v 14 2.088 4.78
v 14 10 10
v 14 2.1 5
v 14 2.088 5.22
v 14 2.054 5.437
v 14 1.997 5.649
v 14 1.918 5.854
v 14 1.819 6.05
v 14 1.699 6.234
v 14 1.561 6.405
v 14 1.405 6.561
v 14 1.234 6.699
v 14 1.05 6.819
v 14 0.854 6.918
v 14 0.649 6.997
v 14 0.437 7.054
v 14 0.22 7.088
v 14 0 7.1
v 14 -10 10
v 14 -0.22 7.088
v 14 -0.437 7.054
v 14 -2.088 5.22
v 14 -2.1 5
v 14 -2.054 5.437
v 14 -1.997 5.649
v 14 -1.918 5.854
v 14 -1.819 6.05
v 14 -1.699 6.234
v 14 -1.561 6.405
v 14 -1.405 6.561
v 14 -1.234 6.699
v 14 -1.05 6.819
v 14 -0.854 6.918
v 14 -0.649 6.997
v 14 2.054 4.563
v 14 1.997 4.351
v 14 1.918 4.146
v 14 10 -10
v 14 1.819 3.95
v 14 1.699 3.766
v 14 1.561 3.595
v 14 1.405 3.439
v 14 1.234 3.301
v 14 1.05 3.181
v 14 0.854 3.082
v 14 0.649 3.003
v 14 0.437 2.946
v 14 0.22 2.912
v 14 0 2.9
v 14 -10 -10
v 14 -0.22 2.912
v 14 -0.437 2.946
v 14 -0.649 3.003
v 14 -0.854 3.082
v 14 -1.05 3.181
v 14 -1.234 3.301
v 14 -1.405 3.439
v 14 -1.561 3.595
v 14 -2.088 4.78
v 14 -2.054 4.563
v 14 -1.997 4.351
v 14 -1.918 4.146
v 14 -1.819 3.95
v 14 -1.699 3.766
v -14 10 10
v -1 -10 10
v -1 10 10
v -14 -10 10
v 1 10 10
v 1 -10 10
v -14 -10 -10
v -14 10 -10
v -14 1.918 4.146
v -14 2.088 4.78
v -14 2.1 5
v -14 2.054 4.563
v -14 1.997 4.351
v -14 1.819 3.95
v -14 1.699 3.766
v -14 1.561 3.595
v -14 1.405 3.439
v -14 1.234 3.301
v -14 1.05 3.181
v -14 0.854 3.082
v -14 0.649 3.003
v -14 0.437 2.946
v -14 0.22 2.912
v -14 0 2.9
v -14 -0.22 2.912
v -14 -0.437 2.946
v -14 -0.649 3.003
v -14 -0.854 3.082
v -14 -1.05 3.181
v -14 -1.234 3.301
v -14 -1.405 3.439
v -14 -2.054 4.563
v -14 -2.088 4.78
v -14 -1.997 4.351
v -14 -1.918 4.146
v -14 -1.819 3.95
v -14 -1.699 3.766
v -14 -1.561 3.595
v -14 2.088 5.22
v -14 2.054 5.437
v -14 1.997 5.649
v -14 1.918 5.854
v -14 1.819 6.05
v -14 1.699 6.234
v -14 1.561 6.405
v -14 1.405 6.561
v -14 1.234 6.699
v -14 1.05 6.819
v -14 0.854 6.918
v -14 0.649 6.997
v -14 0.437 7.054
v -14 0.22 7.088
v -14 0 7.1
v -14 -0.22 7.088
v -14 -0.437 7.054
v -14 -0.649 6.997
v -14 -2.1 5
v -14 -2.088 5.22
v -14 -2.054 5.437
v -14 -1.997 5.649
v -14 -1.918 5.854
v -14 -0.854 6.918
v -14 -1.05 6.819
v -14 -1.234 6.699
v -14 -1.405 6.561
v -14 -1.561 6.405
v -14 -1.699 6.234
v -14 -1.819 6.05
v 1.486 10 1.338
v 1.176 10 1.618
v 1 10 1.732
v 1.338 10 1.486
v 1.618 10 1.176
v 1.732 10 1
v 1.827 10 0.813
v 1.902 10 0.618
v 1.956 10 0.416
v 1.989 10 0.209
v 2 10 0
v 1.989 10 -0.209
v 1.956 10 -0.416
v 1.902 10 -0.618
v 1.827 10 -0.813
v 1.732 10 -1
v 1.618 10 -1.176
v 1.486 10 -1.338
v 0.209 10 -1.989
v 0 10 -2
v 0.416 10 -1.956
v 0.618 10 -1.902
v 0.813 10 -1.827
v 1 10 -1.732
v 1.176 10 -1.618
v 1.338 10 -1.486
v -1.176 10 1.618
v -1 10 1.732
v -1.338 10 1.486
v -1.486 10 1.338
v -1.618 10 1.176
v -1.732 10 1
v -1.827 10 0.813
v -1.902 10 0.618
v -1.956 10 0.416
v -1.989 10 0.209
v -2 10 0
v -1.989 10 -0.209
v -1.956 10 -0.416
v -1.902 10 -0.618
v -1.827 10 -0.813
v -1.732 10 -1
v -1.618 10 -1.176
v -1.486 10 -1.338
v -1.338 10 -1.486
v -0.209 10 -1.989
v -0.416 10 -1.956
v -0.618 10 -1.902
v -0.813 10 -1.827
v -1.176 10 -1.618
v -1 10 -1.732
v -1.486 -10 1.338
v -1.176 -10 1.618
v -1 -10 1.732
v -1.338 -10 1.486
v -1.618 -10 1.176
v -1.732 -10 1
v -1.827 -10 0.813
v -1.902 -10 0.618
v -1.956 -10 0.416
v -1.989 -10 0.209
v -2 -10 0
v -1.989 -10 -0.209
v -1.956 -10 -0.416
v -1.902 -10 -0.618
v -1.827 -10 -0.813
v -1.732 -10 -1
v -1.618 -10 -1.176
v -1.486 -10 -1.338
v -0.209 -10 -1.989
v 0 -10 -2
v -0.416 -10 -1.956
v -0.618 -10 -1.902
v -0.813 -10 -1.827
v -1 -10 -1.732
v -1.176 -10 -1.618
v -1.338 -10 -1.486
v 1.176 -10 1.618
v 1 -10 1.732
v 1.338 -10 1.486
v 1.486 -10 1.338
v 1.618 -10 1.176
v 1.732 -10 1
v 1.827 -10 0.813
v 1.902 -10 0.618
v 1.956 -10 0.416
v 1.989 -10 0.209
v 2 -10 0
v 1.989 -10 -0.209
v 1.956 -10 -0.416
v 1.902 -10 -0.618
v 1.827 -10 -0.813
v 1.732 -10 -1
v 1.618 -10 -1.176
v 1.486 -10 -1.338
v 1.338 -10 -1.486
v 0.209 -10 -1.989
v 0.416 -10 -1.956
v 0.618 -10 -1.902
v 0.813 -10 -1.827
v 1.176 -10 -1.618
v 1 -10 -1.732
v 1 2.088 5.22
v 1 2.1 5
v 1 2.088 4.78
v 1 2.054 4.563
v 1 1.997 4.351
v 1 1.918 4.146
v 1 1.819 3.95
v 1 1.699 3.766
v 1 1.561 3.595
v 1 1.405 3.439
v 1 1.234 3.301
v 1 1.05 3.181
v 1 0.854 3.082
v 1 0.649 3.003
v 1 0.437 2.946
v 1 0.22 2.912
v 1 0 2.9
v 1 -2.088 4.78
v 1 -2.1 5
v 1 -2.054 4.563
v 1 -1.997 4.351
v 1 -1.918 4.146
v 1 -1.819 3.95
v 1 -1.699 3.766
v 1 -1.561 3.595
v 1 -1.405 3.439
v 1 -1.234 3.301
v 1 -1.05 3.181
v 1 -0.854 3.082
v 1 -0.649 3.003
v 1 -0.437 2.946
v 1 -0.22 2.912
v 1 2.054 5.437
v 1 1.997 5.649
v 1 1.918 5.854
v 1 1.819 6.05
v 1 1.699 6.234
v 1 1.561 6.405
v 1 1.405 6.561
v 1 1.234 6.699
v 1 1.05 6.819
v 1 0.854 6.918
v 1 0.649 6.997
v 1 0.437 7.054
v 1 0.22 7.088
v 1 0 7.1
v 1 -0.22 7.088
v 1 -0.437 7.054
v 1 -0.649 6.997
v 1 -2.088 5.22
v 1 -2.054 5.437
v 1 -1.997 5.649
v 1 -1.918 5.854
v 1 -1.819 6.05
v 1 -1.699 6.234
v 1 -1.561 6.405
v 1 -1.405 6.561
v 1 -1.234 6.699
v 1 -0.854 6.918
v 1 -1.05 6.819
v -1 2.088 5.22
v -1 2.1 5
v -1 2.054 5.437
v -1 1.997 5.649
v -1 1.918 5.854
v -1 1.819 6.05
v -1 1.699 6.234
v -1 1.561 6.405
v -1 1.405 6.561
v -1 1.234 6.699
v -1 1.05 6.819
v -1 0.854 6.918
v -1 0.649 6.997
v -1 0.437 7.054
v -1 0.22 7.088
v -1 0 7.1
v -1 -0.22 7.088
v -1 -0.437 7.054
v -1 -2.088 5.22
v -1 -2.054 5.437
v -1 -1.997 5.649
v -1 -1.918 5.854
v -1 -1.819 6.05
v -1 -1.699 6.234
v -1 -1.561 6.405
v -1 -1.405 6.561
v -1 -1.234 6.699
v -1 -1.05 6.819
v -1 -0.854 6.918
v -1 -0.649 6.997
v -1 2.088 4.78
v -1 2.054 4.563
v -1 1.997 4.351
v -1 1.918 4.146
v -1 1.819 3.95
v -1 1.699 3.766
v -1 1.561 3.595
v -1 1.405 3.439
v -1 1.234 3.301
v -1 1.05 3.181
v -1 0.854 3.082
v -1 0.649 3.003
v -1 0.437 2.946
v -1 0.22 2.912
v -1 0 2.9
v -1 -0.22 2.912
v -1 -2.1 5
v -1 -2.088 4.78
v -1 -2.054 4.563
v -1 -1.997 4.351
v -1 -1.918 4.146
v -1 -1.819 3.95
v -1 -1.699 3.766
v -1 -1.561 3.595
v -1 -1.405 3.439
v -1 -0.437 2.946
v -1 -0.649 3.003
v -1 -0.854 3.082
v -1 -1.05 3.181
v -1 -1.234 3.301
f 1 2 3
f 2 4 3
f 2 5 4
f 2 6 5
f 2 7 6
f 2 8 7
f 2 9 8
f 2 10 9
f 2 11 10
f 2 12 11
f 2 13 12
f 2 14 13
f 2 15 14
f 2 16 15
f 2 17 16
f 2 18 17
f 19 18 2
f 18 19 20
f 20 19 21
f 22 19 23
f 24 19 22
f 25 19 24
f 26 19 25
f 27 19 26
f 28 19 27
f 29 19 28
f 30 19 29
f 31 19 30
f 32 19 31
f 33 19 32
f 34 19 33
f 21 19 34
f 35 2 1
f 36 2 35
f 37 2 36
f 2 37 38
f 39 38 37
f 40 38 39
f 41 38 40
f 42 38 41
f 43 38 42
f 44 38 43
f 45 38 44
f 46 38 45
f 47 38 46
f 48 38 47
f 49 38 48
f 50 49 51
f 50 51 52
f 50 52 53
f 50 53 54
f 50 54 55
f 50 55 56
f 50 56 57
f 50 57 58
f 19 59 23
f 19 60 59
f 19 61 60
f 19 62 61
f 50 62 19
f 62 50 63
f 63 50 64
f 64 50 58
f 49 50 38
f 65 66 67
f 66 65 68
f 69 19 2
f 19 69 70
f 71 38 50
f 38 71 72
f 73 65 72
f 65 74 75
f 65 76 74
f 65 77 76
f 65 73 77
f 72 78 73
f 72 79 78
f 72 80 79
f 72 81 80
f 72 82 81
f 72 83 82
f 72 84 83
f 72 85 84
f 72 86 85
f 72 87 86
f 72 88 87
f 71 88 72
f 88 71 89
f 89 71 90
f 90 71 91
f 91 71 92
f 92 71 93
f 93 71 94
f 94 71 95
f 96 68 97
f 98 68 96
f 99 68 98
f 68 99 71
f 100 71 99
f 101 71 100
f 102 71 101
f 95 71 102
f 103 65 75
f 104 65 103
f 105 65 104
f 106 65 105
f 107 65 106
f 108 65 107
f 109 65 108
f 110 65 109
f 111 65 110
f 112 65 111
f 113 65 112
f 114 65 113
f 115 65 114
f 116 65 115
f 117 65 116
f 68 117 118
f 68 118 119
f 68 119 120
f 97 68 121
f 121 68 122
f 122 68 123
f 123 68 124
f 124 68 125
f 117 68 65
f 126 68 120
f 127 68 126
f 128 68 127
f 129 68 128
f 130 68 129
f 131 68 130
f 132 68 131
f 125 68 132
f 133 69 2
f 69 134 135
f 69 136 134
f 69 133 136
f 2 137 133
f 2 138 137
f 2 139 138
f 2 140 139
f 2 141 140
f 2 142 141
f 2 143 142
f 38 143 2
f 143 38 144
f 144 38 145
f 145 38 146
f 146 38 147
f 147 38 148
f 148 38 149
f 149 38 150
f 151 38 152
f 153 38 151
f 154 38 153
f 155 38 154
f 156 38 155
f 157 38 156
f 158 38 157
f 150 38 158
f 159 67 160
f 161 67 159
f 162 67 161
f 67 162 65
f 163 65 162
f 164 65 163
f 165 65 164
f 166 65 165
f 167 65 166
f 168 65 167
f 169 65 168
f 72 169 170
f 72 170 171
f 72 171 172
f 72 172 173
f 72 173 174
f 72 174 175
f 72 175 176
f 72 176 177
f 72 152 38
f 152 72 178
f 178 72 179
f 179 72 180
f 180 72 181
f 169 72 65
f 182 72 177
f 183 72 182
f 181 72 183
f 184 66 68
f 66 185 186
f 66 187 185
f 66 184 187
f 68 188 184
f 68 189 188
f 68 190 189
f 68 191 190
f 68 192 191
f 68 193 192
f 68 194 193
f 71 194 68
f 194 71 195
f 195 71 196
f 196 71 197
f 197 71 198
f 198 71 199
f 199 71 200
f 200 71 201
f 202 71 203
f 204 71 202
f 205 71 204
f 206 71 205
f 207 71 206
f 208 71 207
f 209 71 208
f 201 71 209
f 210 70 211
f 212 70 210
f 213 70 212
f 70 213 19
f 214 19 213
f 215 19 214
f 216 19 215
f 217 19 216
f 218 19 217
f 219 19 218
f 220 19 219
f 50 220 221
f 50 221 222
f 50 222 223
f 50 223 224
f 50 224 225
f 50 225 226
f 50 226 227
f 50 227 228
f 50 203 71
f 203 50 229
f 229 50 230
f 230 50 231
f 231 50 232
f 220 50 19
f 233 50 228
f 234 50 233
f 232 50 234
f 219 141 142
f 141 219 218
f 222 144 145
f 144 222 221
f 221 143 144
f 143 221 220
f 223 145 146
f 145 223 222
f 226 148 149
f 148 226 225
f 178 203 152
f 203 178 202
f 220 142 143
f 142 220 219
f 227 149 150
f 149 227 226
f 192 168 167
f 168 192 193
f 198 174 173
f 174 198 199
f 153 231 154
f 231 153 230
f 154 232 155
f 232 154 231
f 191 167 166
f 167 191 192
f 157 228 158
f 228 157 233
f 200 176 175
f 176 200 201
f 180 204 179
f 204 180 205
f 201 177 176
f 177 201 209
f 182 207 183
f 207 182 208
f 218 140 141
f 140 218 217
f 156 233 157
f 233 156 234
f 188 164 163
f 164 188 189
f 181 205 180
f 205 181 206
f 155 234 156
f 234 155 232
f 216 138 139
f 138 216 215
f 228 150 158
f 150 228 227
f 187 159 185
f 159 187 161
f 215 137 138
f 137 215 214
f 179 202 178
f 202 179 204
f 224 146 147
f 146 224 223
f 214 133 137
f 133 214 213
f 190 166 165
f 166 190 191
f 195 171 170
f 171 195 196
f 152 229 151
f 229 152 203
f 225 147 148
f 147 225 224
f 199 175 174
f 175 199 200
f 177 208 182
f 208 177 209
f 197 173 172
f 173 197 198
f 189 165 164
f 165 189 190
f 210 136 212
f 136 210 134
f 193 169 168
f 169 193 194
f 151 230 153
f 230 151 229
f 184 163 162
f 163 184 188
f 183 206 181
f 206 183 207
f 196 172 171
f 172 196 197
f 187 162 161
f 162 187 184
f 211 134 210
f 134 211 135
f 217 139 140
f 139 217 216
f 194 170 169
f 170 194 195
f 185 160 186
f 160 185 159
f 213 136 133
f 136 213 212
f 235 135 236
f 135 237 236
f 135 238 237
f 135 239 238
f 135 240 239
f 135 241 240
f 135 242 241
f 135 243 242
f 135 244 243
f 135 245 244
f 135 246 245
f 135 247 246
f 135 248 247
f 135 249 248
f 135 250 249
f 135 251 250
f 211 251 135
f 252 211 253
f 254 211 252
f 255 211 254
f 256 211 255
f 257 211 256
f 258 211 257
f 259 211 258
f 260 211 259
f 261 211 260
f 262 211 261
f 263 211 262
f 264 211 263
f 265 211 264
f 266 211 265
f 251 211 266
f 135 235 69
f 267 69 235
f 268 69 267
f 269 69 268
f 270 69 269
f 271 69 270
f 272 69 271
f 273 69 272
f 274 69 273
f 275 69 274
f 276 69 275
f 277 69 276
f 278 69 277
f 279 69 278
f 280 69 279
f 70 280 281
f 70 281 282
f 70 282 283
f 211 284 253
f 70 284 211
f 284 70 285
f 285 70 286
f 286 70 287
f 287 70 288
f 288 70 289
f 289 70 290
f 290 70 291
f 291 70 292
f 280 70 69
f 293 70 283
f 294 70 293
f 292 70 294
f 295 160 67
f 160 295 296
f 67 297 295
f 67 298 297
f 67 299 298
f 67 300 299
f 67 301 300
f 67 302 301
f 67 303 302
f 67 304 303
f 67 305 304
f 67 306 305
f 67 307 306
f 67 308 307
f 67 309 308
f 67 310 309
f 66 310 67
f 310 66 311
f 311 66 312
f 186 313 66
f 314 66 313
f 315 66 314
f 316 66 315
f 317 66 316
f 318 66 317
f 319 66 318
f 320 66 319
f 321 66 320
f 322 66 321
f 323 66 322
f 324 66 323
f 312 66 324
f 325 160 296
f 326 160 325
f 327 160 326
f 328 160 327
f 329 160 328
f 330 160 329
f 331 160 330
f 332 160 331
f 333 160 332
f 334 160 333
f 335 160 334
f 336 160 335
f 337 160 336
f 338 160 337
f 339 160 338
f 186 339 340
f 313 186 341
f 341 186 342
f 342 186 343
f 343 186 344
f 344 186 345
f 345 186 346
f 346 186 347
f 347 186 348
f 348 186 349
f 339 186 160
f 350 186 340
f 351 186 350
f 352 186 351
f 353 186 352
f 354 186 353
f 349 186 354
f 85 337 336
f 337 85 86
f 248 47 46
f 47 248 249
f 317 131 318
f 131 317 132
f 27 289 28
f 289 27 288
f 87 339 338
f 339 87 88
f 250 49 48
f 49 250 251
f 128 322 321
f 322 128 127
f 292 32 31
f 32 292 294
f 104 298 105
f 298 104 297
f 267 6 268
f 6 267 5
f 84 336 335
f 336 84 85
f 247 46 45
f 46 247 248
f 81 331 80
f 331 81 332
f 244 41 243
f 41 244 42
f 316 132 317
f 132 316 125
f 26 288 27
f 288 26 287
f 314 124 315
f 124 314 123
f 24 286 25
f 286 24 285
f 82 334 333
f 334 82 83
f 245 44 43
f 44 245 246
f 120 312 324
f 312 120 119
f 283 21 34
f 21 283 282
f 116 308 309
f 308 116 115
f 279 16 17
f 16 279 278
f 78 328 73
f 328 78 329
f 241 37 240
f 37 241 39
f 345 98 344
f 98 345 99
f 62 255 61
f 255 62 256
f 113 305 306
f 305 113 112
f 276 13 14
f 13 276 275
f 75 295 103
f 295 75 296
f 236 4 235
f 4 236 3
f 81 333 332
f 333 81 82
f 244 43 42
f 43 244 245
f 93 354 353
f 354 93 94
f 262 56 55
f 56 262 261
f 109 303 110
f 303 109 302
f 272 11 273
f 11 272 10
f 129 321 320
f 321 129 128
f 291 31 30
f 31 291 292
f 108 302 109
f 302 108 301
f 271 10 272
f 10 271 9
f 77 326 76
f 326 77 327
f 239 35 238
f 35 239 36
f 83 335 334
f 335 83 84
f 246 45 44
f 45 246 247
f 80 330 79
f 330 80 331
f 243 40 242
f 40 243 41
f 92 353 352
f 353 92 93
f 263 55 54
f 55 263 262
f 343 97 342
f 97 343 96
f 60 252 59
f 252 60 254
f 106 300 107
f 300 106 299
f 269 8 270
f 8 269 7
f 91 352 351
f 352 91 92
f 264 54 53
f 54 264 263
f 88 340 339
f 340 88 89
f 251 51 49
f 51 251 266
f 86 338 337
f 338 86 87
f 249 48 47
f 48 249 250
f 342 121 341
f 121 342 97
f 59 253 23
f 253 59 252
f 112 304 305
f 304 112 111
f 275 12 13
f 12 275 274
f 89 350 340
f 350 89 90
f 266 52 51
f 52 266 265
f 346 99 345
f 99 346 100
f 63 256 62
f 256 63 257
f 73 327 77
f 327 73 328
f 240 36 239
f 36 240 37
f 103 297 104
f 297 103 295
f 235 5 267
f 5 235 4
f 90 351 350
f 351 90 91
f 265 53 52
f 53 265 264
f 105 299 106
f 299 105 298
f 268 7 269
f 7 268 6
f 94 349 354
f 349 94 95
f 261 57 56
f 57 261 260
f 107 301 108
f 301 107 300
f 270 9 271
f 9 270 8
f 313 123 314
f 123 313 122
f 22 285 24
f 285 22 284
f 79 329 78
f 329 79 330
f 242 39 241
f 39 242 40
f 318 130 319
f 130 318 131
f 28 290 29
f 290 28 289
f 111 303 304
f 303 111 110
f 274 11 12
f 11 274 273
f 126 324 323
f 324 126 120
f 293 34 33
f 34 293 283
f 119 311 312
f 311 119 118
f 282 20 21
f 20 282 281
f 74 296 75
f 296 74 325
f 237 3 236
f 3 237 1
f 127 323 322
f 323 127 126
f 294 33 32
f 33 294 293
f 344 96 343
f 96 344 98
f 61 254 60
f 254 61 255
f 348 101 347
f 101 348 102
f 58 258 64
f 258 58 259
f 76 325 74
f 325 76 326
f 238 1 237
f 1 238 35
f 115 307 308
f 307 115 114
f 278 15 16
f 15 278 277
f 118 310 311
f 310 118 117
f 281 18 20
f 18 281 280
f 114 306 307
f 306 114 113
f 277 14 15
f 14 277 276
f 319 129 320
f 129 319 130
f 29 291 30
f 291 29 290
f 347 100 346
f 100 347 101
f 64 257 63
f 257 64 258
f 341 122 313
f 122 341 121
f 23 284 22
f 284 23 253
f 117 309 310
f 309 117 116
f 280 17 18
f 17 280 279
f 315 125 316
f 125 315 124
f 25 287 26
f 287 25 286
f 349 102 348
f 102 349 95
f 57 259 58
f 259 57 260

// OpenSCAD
// Split clamp block.
$fn = 60;
eps = 0.02;
bore_d = 4;
body_w = 20;
body_h = 20;
body_l = 28;
slot_w = 2;
difference() {
    cube([body_l, body_w, body_h], center = true);
    translate([0, -body_w / 2 - eps, 0]) rotate([-90,0,0]) cylinder(d = bore_d, h = body_w + 2 * eps);
    translate([-slot_w / 2, -body_w / 2 - eps, 0]) cube([slot_w, body_w + 2 * eps, body_h / 2 + eps]);
    translate([-body_l / 2 - eps, 0, body_h / 2 - 5]) rotate([0,90,0]) cylinder(d = 4.2, h = body_l + 2 * eps);
}
